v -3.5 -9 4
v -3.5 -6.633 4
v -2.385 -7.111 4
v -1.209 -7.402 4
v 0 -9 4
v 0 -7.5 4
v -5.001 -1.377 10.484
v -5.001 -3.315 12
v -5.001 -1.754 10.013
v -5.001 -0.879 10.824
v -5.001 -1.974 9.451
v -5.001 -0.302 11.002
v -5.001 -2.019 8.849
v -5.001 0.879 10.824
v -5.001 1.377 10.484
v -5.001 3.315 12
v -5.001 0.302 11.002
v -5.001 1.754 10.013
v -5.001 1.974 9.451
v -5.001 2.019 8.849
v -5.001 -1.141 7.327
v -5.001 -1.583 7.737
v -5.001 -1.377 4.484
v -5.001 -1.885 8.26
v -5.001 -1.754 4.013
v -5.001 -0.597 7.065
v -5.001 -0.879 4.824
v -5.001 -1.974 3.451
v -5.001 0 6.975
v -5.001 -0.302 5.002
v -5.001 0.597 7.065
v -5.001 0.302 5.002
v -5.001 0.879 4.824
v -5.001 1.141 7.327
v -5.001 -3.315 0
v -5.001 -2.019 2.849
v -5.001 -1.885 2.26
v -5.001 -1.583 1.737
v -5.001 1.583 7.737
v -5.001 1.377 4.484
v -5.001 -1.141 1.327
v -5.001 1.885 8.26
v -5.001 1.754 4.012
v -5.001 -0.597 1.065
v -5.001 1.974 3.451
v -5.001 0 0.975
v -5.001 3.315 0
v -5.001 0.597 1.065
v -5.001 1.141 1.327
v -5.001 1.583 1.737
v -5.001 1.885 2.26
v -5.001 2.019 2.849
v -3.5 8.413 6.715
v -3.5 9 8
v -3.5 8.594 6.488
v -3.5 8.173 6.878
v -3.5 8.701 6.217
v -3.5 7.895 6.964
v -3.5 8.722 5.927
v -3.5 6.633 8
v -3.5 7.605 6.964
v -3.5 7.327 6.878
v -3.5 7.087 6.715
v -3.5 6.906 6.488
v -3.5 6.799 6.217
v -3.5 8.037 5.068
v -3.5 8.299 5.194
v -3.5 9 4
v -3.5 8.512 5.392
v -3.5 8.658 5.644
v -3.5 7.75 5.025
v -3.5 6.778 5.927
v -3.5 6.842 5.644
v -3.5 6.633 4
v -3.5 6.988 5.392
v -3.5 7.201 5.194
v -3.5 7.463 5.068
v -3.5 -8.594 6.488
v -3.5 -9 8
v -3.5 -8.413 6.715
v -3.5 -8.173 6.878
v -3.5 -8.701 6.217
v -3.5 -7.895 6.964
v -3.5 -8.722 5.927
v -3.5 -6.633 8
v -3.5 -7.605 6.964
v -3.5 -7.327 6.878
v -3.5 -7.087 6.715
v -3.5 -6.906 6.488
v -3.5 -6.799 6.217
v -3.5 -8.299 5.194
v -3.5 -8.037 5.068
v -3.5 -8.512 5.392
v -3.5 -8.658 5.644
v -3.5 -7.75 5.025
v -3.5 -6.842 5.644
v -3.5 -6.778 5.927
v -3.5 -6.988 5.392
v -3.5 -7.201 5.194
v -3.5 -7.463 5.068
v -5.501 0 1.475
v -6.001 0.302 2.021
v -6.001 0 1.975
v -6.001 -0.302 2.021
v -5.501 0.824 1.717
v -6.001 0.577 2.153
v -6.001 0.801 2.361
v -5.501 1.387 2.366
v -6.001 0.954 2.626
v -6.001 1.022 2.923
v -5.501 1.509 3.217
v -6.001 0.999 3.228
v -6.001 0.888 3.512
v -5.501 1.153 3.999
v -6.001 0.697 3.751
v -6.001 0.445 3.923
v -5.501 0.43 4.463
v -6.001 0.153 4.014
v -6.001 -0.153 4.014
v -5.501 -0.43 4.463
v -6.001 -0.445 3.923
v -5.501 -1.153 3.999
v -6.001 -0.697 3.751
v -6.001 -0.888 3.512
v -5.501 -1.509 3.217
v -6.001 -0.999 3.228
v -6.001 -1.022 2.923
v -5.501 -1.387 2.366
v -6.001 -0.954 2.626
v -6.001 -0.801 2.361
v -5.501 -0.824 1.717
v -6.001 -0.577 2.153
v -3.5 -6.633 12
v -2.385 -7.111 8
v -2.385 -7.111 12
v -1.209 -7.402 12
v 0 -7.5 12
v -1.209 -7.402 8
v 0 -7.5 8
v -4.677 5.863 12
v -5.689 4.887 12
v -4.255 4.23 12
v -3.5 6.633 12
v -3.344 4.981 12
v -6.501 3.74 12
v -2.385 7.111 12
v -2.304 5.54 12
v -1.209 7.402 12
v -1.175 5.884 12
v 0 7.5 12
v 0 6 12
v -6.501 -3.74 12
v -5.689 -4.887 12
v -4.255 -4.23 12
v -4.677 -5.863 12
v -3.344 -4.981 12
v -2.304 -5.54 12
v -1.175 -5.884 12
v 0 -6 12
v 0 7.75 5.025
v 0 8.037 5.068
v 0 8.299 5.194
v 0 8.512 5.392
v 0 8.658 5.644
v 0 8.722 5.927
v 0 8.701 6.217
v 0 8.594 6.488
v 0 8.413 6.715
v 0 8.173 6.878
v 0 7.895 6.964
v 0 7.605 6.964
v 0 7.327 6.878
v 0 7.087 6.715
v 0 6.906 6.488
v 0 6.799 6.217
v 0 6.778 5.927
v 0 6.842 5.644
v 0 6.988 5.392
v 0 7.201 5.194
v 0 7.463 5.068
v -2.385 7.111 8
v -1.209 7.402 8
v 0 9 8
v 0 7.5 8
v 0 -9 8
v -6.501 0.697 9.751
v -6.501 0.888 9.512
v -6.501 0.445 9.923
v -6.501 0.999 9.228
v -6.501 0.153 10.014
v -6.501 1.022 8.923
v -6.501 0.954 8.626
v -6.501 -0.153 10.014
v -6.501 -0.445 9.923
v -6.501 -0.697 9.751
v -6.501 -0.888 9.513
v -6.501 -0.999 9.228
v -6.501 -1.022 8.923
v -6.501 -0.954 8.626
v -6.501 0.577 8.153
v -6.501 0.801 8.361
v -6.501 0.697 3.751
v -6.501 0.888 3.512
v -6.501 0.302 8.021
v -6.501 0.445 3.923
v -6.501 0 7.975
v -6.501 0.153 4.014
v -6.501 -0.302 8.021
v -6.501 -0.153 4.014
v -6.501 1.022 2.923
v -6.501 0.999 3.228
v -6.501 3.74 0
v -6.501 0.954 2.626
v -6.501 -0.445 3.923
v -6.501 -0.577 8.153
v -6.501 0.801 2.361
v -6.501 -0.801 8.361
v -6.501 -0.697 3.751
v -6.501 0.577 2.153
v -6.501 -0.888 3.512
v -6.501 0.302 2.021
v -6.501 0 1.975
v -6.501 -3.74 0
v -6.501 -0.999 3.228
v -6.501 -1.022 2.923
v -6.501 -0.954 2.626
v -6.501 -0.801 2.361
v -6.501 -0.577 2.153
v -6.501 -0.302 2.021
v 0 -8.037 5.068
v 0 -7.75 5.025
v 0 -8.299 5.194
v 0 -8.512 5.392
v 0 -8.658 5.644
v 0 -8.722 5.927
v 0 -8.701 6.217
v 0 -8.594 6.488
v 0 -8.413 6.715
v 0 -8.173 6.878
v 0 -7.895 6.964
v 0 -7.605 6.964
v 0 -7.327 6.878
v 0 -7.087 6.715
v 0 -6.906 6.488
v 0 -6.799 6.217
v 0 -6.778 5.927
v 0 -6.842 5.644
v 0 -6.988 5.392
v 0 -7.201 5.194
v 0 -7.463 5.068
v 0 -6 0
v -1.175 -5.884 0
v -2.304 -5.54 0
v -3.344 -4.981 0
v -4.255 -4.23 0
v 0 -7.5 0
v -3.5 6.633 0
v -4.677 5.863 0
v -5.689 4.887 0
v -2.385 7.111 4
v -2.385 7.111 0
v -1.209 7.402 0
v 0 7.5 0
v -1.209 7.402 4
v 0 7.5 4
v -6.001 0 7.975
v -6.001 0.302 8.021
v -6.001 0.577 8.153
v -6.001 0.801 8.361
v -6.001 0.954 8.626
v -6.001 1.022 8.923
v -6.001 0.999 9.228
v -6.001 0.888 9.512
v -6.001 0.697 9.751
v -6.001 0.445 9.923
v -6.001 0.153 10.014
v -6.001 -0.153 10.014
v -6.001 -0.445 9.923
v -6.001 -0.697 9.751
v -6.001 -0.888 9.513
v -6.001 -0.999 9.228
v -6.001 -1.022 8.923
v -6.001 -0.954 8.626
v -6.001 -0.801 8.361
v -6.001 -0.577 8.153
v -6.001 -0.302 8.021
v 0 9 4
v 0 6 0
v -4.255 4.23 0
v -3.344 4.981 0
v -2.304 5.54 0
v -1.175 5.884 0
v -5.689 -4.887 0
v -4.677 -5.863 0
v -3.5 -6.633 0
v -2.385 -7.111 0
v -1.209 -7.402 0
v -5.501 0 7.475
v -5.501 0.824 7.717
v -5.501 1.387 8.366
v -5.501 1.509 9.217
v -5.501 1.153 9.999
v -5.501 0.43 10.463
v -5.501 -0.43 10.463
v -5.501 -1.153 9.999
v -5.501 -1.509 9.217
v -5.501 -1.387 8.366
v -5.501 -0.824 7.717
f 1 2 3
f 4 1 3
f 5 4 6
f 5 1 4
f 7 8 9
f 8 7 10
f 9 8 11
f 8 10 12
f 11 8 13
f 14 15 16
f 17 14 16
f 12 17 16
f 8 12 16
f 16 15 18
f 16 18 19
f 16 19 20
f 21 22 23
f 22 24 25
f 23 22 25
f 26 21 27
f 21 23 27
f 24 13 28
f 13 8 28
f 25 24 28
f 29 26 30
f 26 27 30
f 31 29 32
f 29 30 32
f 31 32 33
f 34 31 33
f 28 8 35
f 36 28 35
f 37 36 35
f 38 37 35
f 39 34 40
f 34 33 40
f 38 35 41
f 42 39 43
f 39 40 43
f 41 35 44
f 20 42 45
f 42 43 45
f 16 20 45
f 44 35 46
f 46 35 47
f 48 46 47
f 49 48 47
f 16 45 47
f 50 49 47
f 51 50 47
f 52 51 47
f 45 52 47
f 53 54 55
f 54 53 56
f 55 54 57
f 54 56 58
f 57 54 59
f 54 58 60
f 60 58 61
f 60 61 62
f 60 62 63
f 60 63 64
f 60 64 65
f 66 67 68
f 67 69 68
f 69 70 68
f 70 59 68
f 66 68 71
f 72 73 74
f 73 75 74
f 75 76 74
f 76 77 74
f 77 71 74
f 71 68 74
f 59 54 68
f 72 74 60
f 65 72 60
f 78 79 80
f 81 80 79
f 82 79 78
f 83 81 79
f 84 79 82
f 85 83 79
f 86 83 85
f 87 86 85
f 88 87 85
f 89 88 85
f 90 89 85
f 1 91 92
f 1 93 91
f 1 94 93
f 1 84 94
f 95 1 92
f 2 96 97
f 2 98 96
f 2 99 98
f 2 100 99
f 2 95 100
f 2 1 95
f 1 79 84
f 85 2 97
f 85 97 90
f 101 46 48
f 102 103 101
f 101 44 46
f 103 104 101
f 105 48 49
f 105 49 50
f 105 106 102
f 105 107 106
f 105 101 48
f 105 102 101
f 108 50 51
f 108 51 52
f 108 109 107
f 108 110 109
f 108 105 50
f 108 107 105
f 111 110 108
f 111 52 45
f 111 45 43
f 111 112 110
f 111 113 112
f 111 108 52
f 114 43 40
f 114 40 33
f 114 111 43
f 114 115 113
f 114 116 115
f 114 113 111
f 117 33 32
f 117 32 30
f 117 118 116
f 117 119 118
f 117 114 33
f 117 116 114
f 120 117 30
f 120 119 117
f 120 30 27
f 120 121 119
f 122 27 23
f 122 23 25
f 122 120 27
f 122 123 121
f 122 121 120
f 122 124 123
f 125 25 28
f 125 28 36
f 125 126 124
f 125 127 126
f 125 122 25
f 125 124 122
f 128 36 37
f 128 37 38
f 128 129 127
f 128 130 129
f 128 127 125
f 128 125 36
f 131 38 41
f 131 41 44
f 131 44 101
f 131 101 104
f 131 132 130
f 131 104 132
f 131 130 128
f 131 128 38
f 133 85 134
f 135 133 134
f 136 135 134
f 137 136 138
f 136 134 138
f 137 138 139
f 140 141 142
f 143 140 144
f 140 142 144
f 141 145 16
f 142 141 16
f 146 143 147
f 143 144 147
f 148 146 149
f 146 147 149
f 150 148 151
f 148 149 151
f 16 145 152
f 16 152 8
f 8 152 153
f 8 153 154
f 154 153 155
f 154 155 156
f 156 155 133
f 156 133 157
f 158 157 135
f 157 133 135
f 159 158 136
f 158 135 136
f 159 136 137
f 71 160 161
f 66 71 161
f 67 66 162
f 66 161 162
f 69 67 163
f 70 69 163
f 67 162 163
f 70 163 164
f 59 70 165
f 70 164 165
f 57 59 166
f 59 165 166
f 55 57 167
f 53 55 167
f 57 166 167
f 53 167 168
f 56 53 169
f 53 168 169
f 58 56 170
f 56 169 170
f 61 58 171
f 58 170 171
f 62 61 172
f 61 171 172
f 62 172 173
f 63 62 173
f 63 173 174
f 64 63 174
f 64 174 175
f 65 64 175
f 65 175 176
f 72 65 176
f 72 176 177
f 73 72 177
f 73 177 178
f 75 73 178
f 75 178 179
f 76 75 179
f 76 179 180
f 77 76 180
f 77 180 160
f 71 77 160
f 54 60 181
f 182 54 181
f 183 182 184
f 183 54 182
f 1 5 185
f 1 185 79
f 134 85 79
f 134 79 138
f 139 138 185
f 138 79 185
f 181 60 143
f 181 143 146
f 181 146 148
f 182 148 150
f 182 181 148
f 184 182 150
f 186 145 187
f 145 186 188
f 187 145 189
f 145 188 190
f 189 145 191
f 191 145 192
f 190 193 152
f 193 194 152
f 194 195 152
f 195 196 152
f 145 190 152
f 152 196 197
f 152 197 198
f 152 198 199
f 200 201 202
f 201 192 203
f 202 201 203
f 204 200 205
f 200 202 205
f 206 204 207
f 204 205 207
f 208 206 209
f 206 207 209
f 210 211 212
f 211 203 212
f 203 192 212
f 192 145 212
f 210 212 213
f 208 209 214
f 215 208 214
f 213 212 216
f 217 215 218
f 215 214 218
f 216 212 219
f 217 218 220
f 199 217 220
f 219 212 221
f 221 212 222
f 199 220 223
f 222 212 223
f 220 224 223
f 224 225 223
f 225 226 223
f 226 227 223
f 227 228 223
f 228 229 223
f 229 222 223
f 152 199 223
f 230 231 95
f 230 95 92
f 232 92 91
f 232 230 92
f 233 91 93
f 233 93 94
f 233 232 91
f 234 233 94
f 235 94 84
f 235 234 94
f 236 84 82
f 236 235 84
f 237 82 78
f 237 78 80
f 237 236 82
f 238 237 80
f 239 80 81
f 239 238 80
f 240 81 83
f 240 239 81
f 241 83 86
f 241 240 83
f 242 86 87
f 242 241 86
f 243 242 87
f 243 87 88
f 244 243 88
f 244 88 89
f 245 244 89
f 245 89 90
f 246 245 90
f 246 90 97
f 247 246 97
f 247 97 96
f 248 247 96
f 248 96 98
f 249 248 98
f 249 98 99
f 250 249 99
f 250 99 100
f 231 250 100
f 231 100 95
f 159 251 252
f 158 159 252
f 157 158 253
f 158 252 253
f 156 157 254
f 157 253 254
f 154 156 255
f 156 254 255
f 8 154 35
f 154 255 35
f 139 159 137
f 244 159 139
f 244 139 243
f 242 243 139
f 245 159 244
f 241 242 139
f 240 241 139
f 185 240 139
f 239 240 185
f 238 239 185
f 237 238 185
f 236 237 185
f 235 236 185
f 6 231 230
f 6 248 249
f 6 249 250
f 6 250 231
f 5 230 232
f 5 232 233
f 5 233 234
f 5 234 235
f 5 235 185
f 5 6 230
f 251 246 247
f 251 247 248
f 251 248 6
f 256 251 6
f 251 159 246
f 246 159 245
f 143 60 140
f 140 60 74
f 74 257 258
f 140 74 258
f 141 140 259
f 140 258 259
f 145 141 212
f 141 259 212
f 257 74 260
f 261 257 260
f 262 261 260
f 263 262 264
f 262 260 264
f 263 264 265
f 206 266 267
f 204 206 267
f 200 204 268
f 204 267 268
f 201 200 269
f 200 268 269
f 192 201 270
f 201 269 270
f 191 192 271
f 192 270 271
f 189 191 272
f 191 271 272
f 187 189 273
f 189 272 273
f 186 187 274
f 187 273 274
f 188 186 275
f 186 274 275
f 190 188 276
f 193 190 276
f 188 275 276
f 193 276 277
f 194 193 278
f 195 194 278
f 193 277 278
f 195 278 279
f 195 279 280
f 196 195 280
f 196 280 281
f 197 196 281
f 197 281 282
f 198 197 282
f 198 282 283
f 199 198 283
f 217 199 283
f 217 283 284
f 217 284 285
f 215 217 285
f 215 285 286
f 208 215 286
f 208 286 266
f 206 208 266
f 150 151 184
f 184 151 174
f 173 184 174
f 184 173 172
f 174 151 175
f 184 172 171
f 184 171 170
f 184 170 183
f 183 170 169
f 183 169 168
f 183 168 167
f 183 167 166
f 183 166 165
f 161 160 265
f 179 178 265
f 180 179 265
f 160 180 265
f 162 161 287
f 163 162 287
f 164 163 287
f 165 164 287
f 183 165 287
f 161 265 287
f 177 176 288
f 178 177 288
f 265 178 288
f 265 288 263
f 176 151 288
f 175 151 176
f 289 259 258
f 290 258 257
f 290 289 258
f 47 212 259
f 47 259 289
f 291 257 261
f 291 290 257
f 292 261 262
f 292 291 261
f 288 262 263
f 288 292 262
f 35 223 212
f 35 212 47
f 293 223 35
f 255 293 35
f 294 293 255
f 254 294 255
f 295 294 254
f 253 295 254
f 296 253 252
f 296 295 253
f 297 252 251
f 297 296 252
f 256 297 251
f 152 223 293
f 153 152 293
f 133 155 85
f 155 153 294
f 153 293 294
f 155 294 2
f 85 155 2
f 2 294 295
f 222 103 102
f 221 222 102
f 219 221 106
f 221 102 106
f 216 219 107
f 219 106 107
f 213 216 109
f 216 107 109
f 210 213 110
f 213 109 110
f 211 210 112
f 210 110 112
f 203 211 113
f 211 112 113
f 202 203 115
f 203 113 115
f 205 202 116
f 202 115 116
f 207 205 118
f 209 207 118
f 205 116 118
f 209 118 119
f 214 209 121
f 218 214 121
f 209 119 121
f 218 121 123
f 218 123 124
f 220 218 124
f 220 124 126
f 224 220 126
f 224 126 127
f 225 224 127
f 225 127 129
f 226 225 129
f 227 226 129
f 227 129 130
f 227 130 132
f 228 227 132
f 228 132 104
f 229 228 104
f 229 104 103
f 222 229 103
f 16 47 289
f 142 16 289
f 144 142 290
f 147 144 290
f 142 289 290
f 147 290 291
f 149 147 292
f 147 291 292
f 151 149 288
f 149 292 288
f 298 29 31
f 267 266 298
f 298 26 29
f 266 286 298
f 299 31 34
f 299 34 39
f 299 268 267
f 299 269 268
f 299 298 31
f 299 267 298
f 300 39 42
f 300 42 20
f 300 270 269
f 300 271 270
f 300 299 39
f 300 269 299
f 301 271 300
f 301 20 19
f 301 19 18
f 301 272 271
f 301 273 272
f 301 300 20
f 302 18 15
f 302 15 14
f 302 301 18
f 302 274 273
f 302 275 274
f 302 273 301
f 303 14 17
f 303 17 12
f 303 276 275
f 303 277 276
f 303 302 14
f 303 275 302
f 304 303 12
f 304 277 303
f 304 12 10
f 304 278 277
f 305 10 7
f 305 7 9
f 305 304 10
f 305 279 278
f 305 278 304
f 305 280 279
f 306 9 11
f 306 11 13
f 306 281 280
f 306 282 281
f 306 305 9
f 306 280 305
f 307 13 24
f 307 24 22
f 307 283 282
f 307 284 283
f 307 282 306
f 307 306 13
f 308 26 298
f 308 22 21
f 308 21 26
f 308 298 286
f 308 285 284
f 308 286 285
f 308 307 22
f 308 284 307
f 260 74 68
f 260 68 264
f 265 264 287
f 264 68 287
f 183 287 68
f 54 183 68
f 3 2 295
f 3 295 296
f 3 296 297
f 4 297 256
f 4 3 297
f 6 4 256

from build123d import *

# Parameters (mm, degrees)
BOSS_EXTRUDE2_DEPTH  = 12
BOSS_EXTRUDE3_START  = -12
BOSS_EXTRUDE3_DEPTH  = 12
CUT_EXTRUDE6_START   = -4
CUT_EXTRUDE6_DEPTH   = 4
CUT_EXTRUDE7_REACH   = 18.348
SKETCH4_R            = 0.975
MIRROR2_START        = -4
MIRROR2_COPY_1_DEPTH = 4
CUT_EXTRUDE8_REACH   = 17.812
SKETCH6_R            = 1.025
CHAMFER1_SIZE        = 1


# Read off the part's stored shape, not the designer's step: Boss-Extrude3
with BuildPart() as part:
    # Sketch1 → Boss-Extrude2 (new body)
    with BuildSketch(Plane.XY):
        with BuildLine():
            Line((0, 6), (0, 7.5))
            ThreePointArc((0, 7.5), (-3.75510396, 6.492241081), (-6.501077384, 3.739785134))
            Line((-6.501077384, 3.739785134), (-6.501077384, -3.739785134))
            ThreePointArc((-6.501077384, -3.739785134), (-3.75510396, -6.492241081), (0, -7.5))
            Line((0, -7.5), (0, -6))
            ThreePointArc((0, -6), (-2.838133189, -5.286303056), (-5.001077384, -3.315))
            ThreePointArc((-5.001077384, -3.315), (-6, 0), (-5.001077384, 3.315))
            ThreePointArc((-5.001077384, 3.315), (-2.838133189, 5.286303056), (0, 6))
        make_face()
        with BuildLine():
            Line((-5.001077384, -3.315), (-5.001077384, 3.315))
            ThreePointArc((-5.001077384, 3.315), (-6, 0), (-5.001077384, -3.315))
        make_face()
    extrude(amount=BOSS_EXTRUDE2_DEPTH)

    # Boss-Extrude3 outline → Boss-Extrude3 (add)
    with BuildSketch(Plane.XY.offset(12).offset(BOSS_EXTRUDE3_START)):
        with BuildLine():
            ThreePointArc((-3.5, 6.633249581), (-1.802862744, 7.280088319), (0, 7.5))
            Line((0, 7.5), (0, 9))
            Line((0, 9), (-3.5, 9))
            Line((-3.5, 9), (-3.5, 6.633249581))
        make_face()
    boss_extrude3 = extrude(amount=BOSS_EXTRUDE3_DEPTH)

    # Sketch3 → Cut-Extrude6 (cut)
    with BuildSketch(Plane.XY.offset(12).offset(CUT_EXTRUDE6_START)):
        with BuildLine():
            Line((-4.617876388, 10.846765639), (-4.617876388, 5.909756142))
            ThreePointArc((-4.617876388, 5.909756142), (-1.858071818, 7.266193578), (1.214101671, 7.401078106))
            Line((1.214101671, 7.401078106), (1.214101671, 10.846765639))
            Line((1.214101671, 10.846765639), (-4.617876388, 10.846765639))
        make_face()
    cut_extrude6 = extrude(amount=CUT_EXTRUDE6_DEPTH, mode=Mode.SUBTRACT)

    # Mirror1: Cut-Extrude6 across plane
    add(cut_extrude6.mirror(Plane.XY.offset(6)), mode=Mode.SUBTRACT)

    # Sketch4 → Cut-Extrude7 (cut, up to next)
    with BuildSketch(Plane(origin=(0, 0, 0), x_dir=(0, 0, -1), z_dir=(1, 0, 0)), mode=Mode.PRIVATE) as cut_extrude7_sk1:
        with Locations((-6, 7.75)):
            Circle(SKETCH4_R)
    cut_extrude7_tool1 = extrude(cut_extrude7_sk1.sketch, amount=-CUT_EXTRUDE7_REACH, mode=Mode.PRIVATE) & part.part
    cut_extrude7 = cut_extrude7_tool1.solids().sort_by_distance((0, 7.75, 6))[0]
    add(cut_extrude7, mode=Mode.SUBTRACT)

    # Mirror2: Boss-Extrude3, Cut-Extrude6, Cut-Extrude7 across plane
    add(boss_extrude3.mirror(Plane.ZX))
    add(cut_extrude6.mirror(Plane.ZX), mode=Mode.SUBTRACT)
    add(cut_extrude7.mirror(Plane.ZX), mode=Mode.SUBTRACT)

    # Mirror2 copy 1 sketch → Mirror2 copy 1 (cut)
    with BuildSketch(Plane(origin=(0, 0, 0), x_dir=(1, 0, 0), z_dir=(0, 0, -1)).offset(MIRROR2_START)):
        with BuildLine():
            Line((-4.617876388, 10.846765639), (-4.617876388, 5.909756142))
            ThreePointArc((-4.617876388, 5.909756142), (-1.858071818, 7.266193578), (1.214101671, 7.401078106))
            Line((1.214101671, 7.401078106), (1.214101671, 10.846765639))
            Line((1.214101671, 10.846765639), (-4.617876388, 10.846765639))
        make_face()
    extrude(amount=MIRROR2_COPY_1_DEPTH, mode=Mode.SUBTRACT)

    # Sketch6 → Cut-Extrude8 (cut, up to next)
    with BuildSketch(Plane(origin=(-5.001077384, 0, 0), x_dir=(0, 0, -1), z_dir=(1, 0, 0)), mode=Mode.PRIVATE) as cut_extrude8_sk1:
        with Locations((-9, 0)):
            Circle(SKETCH6_R)
    cut_extrude8_tool1 = extrude(cut_extrude8_sk1.sketch, amount=-CUT_EXTRUDE8_REACH, mode=Mode.PRIVATE) & part.part
    # Sketch6 → Cut-Extrude8 (cut, up to next)
    with BuildSketch(Plane(origin=(-5.001077384, 0, 0), x_dir=(0, 0, -1), z_dir=(1, 0, 0)), mode=Mode.PRIVATE) as cut_extrude8_sk2:
        with Locations((-3, 0)):
            Circle(SKETCH6_R)
    cut_extrude8_tool2 = extrude(cut_extrude8_sk2.sketch, amount=-CUT_EXTRUDE8_REACH, mode=Mode.PRIVATE) & part.part
    add(cut_extrude8_tool1.solids().sort_by_distance((-5.001077, 0, 9))[0], mode=Mode.SUBTRACT)
    add(cut_extrude8_tool2.solids().sort_by_distance((-5.001077, 0, 3))[0], mode=Mode.SUBTRACT)

    # Chamfer1
    chamfer1_edges = [part.edges().sort_by_distance(p)[0] for p in [
        (-5.001077384, 0, 10.025),
        (-5.001077384, 0, 4.025),
    ]]
    chamfer(chamfer1_edges, length=CHAMFER1_SIZE)


solid = part.part
